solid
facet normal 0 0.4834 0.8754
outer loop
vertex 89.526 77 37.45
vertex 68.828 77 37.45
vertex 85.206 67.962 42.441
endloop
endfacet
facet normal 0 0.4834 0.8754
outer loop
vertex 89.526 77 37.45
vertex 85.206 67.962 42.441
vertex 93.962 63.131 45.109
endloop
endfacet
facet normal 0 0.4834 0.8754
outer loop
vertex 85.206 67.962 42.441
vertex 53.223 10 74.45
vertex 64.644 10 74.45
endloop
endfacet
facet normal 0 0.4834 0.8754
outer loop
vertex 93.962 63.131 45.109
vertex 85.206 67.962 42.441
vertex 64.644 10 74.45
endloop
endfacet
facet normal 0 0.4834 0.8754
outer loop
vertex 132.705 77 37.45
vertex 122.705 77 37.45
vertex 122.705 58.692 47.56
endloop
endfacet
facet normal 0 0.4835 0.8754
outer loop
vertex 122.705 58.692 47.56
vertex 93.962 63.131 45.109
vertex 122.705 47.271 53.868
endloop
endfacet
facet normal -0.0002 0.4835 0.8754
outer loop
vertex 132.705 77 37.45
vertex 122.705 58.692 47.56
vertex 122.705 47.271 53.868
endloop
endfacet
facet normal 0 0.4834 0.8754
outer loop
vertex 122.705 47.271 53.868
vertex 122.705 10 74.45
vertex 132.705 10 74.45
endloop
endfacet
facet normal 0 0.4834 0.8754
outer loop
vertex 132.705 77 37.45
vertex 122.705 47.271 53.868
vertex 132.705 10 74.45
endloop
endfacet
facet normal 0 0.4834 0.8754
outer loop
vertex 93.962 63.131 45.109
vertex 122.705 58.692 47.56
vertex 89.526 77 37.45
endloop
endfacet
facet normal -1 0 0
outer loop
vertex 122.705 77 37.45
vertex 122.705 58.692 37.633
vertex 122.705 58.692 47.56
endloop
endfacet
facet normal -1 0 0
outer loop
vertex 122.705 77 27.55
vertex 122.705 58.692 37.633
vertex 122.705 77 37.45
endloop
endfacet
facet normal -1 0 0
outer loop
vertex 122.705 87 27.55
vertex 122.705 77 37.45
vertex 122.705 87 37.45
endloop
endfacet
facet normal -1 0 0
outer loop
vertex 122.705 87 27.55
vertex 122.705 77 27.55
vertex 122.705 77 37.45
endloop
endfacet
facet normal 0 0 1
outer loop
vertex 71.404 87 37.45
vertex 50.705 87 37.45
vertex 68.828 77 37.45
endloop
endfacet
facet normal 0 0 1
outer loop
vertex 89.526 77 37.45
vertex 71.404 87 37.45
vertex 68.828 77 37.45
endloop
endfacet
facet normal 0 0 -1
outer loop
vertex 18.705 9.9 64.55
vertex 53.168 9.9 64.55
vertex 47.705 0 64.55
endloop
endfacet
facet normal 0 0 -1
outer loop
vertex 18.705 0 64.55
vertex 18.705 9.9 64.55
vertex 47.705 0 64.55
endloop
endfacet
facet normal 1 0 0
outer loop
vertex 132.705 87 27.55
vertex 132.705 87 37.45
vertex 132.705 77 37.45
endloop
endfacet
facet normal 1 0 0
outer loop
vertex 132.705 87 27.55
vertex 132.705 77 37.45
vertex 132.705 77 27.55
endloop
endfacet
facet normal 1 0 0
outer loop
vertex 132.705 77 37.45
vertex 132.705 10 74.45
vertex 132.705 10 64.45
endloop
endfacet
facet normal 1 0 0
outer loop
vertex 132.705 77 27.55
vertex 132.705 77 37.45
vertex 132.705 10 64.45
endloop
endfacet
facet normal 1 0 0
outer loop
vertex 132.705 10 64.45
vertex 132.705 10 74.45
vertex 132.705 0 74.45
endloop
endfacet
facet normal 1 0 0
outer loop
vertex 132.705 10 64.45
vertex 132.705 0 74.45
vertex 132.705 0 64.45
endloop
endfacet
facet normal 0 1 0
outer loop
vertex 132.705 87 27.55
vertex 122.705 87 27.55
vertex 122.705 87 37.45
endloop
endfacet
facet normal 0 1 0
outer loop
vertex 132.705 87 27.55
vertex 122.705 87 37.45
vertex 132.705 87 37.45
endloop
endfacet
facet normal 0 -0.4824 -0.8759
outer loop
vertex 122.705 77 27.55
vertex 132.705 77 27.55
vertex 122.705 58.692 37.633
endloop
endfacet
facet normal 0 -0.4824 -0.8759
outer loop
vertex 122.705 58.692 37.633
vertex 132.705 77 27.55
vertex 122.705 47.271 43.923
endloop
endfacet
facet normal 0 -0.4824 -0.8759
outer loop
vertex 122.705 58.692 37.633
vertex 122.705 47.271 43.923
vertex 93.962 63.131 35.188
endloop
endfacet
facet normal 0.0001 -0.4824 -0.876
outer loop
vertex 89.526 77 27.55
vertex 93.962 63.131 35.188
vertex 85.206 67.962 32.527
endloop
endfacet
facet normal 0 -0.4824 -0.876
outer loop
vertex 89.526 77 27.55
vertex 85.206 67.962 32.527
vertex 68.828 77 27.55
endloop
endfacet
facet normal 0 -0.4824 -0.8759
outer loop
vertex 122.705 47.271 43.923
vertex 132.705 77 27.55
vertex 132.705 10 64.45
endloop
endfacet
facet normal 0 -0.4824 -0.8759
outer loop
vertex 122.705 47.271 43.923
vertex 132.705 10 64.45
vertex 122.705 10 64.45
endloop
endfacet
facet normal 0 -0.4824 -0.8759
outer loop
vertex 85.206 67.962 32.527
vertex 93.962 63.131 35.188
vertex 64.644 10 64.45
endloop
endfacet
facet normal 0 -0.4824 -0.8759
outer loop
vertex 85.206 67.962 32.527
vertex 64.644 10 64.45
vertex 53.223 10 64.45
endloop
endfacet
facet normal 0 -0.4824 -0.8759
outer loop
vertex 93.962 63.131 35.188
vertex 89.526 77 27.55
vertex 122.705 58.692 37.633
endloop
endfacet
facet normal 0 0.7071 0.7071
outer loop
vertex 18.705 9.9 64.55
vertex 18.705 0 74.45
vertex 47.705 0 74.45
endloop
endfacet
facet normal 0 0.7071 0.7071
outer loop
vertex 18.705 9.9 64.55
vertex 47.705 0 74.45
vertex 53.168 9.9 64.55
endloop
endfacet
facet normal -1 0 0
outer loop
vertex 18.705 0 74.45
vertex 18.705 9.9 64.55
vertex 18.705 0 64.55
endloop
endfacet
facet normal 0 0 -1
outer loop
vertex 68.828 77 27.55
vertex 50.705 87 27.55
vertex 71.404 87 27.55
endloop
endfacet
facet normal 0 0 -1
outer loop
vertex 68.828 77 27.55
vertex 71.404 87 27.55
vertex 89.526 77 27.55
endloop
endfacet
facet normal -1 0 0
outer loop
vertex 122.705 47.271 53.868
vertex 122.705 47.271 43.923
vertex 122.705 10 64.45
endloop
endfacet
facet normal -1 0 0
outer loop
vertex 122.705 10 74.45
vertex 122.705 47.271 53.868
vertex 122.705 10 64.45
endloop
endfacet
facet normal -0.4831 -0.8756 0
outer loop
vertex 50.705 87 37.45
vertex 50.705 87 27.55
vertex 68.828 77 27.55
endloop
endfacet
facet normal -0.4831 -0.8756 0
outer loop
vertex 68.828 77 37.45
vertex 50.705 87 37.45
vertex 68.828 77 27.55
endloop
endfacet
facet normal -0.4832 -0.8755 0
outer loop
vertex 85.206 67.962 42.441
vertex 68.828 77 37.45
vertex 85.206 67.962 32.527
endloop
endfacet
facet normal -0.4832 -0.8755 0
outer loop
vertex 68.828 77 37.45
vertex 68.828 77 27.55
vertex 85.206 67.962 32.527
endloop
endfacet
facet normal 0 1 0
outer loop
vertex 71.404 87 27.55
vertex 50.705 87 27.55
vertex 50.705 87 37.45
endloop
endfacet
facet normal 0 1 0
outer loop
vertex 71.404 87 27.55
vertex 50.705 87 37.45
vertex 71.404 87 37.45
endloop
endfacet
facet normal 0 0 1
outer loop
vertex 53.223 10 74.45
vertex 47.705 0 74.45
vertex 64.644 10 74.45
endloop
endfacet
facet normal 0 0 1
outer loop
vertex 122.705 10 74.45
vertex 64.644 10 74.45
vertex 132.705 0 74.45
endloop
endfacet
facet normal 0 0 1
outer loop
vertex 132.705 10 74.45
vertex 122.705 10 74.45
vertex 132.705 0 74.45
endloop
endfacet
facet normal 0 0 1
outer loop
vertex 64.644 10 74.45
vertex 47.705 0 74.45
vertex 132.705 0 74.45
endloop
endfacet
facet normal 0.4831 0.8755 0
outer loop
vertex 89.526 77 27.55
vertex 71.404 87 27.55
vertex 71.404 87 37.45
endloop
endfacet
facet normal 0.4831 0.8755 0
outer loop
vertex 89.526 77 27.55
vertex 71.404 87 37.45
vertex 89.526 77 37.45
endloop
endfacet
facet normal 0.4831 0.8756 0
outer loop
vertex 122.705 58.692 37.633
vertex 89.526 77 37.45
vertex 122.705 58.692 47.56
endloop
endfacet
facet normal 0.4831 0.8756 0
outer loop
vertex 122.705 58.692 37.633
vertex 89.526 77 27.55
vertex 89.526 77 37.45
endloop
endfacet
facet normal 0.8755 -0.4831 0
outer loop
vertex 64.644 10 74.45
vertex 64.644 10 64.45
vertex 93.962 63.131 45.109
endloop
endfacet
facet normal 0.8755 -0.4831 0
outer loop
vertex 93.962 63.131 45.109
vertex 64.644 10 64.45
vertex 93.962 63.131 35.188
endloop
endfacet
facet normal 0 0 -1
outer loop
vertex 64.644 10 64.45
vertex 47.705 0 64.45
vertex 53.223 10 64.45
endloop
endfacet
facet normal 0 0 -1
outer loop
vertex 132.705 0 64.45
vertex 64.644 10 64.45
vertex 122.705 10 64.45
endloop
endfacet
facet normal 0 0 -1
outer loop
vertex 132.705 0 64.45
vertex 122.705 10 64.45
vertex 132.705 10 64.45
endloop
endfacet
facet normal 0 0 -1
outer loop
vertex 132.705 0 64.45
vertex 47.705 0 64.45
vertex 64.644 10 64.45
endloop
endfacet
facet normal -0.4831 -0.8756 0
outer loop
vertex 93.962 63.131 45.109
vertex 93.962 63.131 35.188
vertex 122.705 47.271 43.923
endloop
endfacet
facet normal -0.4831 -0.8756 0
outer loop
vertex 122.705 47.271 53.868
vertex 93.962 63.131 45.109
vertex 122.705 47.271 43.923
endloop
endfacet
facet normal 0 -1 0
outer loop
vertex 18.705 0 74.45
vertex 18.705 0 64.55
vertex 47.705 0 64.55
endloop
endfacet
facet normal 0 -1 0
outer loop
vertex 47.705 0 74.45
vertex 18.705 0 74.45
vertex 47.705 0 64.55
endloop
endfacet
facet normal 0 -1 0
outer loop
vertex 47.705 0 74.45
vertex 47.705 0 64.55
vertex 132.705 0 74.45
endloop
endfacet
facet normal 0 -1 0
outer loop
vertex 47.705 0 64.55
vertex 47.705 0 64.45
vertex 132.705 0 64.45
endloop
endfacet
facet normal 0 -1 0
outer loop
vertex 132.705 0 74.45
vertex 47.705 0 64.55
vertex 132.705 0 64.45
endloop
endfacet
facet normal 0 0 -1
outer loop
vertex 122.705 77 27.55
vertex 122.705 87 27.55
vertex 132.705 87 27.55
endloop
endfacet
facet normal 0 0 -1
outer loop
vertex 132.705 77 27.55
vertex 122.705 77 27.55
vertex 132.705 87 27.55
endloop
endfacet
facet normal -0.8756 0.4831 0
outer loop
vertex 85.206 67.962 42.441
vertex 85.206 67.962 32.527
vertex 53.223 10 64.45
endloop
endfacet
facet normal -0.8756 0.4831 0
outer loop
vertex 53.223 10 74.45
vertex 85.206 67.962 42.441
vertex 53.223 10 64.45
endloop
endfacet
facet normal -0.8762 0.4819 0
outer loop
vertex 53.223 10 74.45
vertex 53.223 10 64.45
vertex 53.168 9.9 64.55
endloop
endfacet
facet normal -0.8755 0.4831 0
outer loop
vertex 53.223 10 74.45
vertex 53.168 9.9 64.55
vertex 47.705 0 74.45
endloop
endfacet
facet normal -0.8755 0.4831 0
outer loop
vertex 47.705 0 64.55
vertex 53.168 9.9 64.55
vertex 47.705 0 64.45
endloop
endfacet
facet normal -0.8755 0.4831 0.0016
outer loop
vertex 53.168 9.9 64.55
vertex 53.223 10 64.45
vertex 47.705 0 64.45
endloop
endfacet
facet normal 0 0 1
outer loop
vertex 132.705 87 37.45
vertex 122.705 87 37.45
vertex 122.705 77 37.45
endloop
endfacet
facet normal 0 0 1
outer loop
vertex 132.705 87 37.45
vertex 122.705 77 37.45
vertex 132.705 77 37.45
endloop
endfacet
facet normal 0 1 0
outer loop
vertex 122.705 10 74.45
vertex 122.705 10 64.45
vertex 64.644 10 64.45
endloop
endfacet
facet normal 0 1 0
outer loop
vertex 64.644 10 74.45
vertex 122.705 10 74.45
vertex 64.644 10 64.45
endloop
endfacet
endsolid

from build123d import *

# Parameters (mm, degrees)
SKETCH8_W               = 85
SKETCH8_H               = 10
BOSS_EXTRUDE4_DEPTH     = 10
SKETCH9_W               = 82
SKETCH9_H               = 9.9
BOSS_EXTRUDE5_DEPTH     = 10
CUT_EXTRUDE2_DEPTH      = 176.278228509
CUT_EXTRUDE2_DEPTH_BACK = 176.278228509
BOSS_EXTRUDE6_DEPTH     = 114


with BuildPart() as part:
    # Sketch8 → Boss-Extrude4 (new body)
    with BuildSketch(Plane(origin=(0, 0, 0), x_dir=(1, 0, 0), z_dir=(0, 1, 0))):
        with Locations((90.205142442, -69.45)):
            Rectangle(SKETCH8_W, SKETCH8_H)
    extrude(amount=BOSS_EXTRUDE4_DEPTH)


with BuildPart() as body_2:
    # Sketch9 → Boss-Extrude5 (new body)
    with BuildSketch(Plane(origin=(0, 87, 0), x_dir=(1, 0, 0), z_dir=(0, 1, 0))):
        with Locations((91.705142442, -32.5)):
            Rectangle(SKETCH9_W, SKETCH9_H)
    extrude(amount=-BOSS_EXTRUDE5_DEPTH)


    add(part.part)  # loft1 joins it to this body
    # loft from a face of the part (loft1)
    loft([body_2.faces().sort_by_distance((91.705142442, 77, 32.5))[0], body_2.faces().sort_by_distance((90.205142442, 10, 69.45))[0]])

    # Sketch1 → Cut-Extrude2 (cut, two sides)
    with BuildSketch(Plane.XY) as cut_extrude2_sk:
        Polygon((122.705142442, 87), (71.403683768, 87), (122.705142442, 58.6920409), align=None)
        Polygon((64.644486366, 10), (93.961994057, 63.13102594), (122.705142442, 47.270660759), (122.705142442, 10), align=None)
        Polygon((47.705142442, 0), (40.860670667, 0), (50.705142442, 87), (85.206484761, 67.96228426), align=None)
    extrude(amount=CUT_EXTRUDE2_DEPTH, mode=Mode.SUBTRACT)
    extrude(cut_extrude2_sk.sketch, amount=-CUT_EXTRUDE2_DEPTH_BACK, mode=Mode.SUBTRACT)

    # Sketch10 → Boss-Extrude6 (add)
    with BuildSketch(Plane(origin=(132.705142442, 0, 0), x_dir=(0, 0, -1), z_dir=(1, 0, 0))):
        Polygon((-64.55, 9.9), (-64.55, 0), (-74.45, 0), align=None)
    extrude(amount=-BOSS_EXTRUDE6_DEPTH)


solid = body_2.part
